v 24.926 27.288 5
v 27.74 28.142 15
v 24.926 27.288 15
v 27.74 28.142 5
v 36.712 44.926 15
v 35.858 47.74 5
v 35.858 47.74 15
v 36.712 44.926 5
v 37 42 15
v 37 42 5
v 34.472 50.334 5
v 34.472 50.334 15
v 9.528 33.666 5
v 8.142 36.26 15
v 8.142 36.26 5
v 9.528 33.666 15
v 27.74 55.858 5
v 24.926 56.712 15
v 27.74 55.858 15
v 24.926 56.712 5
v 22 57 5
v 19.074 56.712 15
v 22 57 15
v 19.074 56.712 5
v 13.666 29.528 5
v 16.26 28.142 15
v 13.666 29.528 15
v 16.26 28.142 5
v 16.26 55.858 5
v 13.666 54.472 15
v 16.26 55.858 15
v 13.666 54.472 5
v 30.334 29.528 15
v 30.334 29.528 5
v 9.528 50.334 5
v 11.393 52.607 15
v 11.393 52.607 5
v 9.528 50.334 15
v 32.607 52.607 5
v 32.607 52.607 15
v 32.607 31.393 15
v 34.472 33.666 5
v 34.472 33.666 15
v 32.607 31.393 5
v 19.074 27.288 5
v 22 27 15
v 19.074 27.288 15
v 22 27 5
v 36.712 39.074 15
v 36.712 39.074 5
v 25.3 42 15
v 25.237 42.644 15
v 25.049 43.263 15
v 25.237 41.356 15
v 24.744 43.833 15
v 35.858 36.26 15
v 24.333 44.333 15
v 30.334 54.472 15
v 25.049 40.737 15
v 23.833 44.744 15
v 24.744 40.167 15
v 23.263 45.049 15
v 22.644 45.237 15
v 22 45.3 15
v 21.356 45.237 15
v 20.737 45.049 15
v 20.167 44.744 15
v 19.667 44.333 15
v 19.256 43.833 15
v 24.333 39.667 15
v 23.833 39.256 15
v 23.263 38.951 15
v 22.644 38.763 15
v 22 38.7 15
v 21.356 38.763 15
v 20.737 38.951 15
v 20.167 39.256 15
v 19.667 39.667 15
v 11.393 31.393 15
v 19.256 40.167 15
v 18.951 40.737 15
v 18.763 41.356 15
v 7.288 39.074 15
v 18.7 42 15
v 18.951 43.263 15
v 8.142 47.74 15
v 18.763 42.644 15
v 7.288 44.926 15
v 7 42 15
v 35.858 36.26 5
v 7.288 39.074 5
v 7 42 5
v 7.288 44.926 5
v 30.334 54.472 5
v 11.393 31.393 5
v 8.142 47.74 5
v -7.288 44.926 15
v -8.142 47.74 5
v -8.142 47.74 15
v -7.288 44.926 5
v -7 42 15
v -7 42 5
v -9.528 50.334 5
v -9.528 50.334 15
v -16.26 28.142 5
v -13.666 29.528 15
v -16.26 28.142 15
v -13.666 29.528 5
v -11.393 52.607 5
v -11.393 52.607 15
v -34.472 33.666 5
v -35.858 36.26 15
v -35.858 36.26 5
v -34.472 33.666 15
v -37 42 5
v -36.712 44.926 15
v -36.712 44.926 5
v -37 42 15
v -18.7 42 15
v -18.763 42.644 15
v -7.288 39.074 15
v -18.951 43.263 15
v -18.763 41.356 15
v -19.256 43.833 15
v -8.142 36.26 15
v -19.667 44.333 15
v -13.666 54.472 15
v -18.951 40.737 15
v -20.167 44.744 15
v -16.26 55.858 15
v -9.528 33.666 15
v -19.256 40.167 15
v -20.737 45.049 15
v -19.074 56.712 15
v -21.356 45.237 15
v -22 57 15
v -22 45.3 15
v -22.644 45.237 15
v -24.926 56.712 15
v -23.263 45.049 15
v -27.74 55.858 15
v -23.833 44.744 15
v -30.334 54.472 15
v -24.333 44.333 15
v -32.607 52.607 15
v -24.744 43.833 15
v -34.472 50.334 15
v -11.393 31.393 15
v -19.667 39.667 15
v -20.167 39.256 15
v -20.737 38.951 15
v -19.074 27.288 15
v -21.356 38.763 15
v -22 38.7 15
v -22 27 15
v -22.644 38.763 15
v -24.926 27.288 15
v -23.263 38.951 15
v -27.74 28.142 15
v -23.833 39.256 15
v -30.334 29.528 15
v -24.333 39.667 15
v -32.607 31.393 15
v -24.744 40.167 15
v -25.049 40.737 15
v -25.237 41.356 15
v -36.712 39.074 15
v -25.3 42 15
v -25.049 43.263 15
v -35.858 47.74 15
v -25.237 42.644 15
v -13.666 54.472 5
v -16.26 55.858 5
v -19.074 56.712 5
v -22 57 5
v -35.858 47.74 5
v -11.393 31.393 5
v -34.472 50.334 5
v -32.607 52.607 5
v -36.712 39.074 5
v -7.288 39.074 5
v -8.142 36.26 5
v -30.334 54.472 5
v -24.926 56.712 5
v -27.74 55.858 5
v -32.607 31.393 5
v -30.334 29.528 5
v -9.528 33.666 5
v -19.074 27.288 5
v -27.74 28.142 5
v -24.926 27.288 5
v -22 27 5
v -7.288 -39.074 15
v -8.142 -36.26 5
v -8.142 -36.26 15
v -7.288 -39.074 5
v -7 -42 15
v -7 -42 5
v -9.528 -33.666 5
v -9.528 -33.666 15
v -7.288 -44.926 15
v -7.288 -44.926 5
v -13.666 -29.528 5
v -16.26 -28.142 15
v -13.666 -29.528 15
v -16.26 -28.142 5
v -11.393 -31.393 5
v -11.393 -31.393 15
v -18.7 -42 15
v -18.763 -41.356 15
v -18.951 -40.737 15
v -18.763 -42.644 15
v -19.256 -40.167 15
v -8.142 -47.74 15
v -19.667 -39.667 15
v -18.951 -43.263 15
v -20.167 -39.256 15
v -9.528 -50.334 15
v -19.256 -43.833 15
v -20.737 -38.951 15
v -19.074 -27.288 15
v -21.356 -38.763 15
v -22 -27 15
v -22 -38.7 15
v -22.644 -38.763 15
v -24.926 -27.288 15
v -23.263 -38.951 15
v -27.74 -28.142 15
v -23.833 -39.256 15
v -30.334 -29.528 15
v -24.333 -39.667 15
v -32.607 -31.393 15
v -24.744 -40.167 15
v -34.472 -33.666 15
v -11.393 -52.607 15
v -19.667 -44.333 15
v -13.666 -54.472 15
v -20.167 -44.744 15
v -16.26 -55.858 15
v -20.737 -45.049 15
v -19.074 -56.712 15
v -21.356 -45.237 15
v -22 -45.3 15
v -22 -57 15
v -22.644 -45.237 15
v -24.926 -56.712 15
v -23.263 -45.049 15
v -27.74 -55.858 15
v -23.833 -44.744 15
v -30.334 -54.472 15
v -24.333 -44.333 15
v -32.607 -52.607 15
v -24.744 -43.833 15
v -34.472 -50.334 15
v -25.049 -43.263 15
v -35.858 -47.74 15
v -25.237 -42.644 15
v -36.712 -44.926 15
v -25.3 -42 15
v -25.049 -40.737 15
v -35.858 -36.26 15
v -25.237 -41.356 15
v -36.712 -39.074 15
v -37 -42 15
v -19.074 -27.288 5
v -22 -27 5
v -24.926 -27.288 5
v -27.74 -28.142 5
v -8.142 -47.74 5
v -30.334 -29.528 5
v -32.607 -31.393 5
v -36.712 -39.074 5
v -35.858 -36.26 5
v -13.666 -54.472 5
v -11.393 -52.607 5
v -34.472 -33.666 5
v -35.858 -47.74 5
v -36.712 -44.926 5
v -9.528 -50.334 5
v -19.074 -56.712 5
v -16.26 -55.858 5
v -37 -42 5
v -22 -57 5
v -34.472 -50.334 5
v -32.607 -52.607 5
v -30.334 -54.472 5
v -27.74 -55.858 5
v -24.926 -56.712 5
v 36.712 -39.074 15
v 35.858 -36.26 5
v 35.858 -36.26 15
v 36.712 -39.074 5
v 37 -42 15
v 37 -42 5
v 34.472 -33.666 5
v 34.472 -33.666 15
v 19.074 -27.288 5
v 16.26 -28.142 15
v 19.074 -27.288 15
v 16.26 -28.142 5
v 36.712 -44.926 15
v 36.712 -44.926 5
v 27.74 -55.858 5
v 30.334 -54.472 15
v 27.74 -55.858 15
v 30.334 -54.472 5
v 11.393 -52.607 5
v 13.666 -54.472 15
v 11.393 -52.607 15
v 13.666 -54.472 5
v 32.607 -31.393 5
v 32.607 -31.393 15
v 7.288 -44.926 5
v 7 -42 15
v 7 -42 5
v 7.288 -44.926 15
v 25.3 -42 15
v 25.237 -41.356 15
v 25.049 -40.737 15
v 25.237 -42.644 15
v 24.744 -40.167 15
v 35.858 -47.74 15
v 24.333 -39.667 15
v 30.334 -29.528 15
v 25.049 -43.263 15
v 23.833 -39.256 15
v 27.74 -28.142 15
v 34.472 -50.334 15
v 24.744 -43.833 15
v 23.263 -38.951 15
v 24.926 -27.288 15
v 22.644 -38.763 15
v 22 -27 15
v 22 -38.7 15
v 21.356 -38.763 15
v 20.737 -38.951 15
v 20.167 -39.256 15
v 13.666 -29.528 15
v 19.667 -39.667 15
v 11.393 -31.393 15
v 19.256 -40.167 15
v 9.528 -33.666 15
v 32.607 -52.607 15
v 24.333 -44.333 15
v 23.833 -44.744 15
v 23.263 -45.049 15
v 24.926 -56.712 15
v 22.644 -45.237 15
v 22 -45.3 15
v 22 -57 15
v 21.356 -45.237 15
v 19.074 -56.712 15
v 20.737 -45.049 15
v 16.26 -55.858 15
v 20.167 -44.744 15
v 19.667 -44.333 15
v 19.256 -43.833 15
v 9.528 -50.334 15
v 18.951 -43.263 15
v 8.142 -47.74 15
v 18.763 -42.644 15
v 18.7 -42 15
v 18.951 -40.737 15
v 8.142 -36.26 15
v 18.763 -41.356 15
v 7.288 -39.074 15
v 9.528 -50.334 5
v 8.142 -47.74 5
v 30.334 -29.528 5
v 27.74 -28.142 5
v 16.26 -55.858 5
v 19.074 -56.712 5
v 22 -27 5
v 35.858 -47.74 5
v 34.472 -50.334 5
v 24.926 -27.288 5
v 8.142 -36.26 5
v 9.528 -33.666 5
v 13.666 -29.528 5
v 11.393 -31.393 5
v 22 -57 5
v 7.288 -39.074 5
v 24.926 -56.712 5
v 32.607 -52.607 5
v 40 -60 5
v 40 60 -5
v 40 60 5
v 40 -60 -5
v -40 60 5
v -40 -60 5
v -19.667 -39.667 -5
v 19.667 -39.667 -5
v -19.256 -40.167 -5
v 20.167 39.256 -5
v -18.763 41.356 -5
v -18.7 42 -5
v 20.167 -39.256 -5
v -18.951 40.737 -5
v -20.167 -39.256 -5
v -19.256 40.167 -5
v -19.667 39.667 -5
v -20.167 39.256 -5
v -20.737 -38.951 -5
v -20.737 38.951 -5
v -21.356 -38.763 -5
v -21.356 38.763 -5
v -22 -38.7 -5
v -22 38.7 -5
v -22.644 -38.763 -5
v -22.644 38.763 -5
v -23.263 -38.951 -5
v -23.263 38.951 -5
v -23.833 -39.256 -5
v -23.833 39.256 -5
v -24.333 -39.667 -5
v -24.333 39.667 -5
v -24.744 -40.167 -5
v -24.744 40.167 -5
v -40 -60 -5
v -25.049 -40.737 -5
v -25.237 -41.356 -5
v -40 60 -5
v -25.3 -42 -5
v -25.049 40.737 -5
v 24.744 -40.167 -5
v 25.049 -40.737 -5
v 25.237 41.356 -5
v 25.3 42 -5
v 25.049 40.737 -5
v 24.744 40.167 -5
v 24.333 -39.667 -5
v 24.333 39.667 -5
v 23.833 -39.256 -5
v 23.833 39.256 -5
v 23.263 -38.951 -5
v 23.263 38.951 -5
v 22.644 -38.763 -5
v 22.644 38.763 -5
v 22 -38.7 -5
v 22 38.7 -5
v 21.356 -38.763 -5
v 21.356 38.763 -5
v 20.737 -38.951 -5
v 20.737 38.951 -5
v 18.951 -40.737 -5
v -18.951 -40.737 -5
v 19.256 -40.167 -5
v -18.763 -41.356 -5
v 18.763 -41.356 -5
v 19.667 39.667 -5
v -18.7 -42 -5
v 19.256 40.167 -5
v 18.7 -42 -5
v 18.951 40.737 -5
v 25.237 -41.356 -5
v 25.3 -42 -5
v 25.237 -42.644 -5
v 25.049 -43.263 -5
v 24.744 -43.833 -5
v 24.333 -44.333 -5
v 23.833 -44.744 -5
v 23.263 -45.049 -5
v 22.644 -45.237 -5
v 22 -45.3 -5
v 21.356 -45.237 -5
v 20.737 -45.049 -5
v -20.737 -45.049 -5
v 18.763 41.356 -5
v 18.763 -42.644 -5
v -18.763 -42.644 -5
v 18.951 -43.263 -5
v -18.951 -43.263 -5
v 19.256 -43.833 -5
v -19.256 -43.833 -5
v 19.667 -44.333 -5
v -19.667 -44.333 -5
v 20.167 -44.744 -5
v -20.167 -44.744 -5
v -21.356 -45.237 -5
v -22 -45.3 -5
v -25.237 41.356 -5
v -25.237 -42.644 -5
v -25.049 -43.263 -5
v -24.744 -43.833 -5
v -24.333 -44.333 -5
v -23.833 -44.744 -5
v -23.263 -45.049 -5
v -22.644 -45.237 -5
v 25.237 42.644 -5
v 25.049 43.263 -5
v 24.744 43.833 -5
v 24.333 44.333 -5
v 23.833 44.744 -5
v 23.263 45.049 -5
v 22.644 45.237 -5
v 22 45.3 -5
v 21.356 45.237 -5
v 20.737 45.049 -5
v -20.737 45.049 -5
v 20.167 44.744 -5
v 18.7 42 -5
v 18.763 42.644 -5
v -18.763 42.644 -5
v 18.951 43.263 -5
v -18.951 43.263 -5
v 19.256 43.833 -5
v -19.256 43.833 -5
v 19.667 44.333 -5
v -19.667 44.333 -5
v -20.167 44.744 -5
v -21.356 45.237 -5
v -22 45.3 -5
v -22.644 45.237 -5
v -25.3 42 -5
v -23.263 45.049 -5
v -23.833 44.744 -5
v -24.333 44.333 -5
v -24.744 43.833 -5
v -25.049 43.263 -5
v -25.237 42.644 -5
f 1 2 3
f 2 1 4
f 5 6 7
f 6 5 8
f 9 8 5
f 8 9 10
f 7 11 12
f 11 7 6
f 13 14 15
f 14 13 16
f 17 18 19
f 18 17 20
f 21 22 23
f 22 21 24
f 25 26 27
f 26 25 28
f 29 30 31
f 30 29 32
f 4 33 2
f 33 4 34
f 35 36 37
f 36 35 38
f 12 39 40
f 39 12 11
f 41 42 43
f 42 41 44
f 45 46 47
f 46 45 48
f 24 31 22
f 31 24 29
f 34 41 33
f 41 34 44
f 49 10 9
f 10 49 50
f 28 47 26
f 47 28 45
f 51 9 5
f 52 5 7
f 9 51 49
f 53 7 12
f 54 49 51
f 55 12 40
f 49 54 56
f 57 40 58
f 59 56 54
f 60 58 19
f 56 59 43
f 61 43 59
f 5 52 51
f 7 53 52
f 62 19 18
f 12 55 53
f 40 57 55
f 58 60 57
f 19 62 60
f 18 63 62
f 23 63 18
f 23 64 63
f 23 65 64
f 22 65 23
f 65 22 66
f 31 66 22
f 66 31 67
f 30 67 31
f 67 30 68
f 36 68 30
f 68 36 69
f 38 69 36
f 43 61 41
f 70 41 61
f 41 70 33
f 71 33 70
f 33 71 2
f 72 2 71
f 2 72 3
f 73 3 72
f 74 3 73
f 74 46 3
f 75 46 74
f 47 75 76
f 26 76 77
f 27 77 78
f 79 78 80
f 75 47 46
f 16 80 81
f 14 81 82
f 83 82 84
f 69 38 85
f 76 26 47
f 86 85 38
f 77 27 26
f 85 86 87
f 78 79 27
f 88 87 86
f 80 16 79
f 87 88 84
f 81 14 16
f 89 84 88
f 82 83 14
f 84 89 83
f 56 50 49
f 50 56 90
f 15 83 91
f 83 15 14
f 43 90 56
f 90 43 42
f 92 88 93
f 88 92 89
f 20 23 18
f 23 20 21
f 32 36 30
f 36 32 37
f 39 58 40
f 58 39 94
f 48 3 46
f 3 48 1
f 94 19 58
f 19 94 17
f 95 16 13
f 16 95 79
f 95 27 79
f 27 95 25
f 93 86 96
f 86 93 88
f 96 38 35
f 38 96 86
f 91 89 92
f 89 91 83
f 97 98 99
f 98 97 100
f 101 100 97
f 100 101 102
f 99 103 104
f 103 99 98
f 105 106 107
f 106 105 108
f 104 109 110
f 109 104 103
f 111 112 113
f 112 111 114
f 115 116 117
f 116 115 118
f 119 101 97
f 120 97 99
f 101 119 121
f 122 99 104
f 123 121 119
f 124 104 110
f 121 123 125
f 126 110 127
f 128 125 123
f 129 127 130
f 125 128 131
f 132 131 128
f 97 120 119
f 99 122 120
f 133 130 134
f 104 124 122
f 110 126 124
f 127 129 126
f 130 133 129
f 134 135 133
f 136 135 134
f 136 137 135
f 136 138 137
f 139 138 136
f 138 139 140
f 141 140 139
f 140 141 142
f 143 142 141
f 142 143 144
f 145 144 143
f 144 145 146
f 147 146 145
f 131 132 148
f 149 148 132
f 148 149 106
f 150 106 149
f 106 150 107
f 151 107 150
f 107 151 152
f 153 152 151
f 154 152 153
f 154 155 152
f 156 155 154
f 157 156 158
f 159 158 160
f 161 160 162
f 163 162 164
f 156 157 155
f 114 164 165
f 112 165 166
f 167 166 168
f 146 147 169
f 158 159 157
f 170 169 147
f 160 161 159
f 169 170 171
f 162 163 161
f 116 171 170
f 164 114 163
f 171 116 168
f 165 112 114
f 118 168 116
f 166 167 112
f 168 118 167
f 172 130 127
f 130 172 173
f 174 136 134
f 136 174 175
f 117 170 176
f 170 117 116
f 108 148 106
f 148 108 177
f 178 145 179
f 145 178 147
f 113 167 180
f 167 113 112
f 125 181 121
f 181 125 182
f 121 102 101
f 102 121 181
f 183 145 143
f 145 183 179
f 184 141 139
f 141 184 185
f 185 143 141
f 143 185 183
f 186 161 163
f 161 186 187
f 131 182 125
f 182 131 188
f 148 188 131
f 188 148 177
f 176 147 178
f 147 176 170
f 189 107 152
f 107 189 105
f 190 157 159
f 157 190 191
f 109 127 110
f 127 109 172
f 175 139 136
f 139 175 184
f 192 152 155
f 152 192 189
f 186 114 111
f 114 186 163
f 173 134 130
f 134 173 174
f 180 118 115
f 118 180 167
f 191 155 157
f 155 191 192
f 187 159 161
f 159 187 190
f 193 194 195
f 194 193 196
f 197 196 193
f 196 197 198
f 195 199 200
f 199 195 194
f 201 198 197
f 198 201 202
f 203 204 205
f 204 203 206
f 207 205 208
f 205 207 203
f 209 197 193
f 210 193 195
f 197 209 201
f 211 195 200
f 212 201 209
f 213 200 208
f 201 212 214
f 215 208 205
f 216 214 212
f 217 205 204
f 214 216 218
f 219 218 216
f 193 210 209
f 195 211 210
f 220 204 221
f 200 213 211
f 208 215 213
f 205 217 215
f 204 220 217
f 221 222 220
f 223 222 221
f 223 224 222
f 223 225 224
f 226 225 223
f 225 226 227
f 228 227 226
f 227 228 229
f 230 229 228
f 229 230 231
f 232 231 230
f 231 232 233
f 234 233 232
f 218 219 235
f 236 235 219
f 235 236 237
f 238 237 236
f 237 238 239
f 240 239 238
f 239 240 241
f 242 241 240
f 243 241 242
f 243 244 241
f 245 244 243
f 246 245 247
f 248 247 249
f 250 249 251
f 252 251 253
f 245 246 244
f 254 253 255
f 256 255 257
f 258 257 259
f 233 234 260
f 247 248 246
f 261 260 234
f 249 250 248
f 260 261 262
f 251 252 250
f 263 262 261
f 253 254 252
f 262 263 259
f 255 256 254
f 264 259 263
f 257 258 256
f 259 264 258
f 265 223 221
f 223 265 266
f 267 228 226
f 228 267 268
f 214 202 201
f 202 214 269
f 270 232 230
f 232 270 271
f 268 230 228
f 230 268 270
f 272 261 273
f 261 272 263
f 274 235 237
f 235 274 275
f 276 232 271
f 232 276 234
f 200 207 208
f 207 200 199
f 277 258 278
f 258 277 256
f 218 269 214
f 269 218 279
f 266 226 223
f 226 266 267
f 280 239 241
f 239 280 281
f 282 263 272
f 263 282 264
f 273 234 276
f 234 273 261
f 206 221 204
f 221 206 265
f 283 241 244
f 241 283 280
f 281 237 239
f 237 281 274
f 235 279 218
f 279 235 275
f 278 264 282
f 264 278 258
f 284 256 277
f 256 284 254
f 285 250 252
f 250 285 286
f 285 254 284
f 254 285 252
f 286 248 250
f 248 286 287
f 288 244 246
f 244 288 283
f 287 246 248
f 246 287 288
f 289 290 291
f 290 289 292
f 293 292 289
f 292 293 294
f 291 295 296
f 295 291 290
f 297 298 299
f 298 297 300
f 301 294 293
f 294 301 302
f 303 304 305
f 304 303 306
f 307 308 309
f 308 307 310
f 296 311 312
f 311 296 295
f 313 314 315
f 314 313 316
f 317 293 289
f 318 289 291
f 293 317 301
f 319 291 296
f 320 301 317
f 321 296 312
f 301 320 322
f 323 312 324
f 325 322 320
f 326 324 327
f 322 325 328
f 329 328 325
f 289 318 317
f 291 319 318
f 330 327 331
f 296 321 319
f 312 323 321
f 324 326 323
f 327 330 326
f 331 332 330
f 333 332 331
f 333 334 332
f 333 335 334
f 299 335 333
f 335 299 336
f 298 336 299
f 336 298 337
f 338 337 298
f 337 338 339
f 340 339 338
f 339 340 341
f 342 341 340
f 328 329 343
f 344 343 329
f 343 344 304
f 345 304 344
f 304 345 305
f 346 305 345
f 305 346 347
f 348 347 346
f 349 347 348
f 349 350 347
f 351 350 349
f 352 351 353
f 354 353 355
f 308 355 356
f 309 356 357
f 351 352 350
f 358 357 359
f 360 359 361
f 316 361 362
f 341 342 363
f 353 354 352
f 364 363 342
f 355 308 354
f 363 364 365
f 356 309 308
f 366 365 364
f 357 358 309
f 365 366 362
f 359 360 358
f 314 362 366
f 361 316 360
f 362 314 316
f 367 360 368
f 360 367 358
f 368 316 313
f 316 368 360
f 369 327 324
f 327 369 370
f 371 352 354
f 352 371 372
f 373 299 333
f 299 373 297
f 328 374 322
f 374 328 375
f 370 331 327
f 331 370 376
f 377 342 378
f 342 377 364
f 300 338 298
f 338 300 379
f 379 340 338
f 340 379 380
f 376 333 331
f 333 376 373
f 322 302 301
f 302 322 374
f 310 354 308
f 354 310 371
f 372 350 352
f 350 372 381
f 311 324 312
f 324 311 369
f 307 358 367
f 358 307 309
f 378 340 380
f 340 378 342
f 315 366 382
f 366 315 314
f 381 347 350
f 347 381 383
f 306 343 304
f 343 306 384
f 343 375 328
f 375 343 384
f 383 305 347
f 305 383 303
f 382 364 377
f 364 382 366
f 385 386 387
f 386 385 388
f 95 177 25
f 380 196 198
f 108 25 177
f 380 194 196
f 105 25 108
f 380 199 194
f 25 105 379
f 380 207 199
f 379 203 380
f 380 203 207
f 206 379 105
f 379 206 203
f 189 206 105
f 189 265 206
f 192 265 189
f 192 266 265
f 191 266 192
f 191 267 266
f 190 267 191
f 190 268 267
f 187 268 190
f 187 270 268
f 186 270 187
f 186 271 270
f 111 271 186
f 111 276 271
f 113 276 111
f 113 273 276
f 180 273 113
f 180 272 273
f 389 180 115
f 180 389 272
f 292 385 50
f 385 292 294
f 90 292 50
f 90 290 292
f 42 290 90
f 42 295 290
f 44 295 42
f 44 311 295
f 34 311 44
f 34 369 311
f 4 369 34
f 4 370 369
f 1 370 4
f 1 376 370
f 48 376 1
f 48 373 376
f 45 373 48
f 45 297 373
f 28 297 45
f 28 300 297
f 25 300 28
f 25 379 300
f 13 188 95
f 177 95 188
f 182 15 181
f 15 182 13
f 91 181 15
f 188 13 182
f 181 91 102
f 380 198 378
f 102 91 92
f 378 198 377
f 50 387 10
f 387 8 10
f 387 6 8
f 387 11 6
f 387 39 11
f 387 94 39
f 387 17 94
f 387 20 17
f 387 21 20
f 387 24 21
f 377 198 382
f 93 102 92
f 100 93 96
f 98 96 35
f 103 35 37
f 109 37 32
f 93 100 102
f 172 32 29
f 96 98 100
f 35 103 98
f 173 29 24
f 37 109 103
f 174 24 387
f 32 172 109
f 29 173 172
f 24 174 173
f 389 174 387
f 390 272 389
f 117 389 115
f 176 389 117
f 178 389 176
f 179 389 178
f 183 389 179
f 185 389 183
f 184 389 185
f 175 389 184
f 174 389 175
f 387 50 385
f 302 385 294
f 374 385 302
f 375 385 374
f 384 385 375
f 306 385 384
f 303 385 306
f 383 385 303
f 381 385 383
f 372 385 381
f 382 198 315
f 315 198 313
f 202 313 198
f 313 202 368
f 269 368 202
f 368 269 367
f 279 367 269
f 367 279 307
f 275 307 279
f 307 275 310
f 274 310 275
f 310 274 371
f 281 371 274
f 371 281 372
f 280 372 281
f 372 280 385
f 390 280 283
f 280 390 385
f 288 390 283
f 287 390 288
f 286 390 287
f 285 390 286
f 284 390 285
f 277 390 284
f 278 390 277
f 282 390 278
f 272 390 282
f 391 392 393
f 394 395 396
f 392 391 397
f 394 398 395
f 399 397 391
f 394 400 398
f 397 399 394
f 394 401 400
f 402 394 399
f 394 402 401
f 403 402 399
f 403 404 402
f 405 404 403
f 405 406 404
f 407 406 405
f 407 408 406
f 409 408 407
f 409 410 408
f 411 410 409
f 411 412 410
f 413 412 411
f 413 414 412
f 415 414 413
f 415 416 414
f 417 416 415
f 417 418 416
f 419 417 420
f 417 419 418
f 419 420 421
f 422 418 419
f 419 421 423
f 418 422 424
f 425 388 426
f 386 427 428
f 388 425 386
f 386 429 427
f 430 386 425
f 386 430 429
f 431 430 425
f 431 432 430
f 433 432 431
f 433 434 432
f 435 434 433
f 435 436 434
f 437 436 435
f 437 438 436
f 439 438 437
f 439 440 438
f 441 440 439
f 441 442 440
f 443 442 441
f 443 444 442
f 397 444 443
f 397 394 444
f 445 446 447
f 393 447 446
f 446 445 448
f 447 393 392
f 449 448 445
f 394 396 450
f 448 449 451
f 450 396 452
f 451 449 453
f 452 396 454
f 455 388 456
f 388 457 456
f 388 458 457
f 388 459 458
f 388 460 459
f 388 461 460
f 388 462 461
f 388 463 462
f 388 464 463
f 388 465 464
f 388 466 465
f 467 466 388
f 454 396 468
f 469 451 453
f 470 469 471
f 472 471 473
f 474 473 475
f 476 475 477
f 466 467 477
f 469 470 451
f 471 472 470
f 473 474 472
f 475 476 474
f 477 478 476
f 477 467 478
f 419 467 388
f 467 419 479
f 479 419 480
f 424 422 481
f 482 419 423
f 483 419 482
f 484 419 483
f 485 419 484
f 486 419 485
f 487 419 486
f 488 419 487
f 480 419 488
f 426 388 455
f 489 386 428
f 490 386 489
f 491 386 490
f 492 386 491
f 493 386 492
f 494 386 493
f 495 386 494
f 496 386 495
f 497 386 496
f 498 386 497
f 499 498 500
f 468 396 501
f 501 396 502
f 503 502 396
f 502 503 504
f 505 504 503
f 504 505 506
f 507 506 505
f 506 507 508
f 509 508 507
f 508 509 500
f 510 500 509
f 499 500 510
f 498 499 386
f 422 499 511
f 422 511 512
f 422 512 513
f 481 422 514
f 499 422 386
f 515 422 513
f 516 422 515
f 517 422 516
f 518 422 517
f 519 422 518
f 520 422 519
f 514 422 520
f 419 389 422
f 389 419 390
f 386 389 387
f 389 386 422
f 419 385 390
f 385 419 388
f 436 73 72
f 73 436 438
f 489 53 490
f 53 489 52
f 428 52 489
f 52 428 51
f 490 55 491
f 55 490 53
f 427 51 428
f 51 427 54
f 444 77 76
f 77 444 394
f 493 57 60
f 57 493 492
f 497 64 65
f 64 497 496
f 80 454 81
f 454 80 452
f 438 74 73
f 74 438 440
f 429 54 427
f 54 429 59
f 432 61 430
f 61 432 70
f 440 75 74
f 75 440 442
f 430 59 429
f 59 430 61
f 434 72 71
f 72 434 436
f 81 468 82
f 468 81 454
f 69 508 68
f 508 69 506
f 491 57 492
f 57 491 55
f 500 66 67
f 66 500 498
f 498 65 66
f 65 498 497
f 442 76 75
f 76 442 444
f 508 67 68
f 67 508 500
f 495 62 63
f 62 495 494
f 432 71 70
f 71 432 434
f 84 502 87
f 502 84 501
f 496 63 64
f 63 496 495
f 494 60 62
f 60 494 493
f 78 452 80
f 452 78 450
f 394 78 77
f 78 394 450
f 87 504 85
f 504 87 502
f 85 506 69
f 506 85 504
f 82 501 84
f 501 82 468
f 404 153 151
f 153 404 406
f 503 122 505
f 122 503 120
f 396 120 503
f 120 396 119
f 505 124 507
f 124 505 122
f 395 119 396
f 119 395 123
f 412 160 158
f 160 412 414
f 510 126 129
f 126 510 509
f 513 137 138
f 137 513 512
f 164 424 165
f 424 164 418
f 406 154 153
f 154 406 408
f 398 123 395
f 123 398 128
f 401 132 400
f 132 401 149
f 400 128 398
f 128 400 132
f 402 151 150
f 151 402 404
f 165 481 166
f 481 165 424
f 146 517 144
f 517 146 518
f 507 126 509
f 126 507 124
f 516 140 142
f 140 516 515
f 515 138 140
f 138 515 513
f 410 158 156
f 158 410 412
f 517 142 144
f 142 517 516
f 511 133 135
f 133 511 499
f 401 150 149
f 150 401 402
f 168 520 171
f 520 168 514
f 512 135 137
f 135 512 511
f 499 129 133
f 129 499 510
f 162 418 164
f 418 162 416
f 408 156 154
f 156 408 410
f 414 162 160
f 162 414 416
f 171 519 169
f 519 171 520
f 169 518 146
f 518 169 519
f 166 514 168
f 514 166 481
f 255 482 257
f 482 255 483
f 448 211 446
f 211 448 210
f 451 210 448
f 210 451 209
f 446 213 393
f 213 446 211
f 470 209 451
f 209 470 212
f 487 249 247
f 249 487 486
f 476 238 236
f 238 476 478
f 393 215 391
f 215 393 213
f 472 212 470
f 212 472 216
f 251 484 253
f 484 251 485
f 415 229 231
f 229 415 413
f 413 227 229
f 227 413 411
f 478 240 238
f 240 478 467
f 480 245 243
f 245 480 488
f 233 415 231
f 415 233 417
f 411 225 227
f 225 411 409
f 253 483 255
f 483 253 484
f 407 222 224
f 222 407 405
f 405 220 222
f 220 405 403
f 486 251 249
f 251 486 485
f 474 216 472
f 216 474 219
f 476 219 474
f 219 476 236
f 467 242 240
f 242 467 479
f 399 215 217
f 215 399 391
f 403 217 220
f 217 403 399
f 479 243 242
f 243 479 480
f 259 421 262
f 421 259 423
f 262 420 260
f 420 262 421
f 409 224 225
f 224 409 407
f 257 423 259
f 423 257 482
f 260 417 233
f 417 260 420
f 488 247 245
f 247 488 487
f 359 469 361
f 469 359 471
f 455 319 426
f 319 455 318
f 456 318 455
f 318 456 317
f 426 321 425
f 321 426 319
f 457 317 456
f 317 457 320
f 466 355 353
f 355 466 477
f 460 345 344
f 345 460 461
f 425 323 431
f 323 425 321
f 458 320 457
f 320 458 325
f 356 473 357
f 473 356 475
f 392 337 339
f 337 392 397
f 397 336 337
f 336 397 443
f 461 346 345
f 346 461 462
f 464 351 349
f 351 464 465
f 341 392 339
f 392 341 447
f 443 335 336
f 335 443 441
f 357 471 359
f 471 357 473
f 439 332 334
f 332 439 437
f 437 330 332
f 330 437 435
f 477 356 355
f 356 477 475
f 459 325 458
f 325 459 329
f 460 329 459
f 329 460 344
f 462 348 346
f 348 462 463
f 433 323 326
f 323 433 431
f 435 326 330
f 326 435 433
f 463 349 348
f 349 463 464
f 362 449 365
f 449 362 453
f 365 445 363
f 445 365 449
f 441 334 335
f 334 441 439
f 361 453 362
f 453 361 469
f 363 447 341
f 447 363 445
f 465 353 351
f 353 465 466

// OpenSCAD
$fn = 32;

// ----------------------------------------------------------------------
// Anchor pads 80 x 120 x 20
// four corner bosses with anchor holes
// ----------------------------------------------------------------------

// --- parameters (mm) ---
plate = [80, 120, 10];  // base plate size (x, y, z)
pads = 4;               // boss count, one per corner
edge = 18;              // boss centre offset from the plate edge
boss_d = 30;            // boss diameter
boss_h = 10;            // boss height above the base plate
hole_d = 6.6;           // hole diameter

// --- derived feature positions (mm) ---
height = plate[2] + boss_h;      // = 20   overall height of the part
corner_x = plate[0] / 2 - edge;  // = 22   boss centre X
corner_y = plate[1] / 2 - edge;  // = 42   boss centre Y
feature_centers = [
  [corner_x, corner_y],
  [-corner_x, corner_y],
  [-corner_x, -corner_y],
  [corner_x, -corner_y]
];   // boss centres, anchor holes are drilled there

// base plate, four bosses standing on it, anchor holes all the way through
difference() {
  union() {
    cube(plate, center = true);
    for (centre = feature_centers)
      translate([centre[0], centre[1], plate[2] / 2 - 1])
        cylinder(d = boss_d, h = boss_h + 1);
  }
  for (centre = feature_centers)
    translate([centre[0], centre[1], -height])
      cylinder(d = hole_d, h = 2 * height + 2);  // through boss and plate
}
